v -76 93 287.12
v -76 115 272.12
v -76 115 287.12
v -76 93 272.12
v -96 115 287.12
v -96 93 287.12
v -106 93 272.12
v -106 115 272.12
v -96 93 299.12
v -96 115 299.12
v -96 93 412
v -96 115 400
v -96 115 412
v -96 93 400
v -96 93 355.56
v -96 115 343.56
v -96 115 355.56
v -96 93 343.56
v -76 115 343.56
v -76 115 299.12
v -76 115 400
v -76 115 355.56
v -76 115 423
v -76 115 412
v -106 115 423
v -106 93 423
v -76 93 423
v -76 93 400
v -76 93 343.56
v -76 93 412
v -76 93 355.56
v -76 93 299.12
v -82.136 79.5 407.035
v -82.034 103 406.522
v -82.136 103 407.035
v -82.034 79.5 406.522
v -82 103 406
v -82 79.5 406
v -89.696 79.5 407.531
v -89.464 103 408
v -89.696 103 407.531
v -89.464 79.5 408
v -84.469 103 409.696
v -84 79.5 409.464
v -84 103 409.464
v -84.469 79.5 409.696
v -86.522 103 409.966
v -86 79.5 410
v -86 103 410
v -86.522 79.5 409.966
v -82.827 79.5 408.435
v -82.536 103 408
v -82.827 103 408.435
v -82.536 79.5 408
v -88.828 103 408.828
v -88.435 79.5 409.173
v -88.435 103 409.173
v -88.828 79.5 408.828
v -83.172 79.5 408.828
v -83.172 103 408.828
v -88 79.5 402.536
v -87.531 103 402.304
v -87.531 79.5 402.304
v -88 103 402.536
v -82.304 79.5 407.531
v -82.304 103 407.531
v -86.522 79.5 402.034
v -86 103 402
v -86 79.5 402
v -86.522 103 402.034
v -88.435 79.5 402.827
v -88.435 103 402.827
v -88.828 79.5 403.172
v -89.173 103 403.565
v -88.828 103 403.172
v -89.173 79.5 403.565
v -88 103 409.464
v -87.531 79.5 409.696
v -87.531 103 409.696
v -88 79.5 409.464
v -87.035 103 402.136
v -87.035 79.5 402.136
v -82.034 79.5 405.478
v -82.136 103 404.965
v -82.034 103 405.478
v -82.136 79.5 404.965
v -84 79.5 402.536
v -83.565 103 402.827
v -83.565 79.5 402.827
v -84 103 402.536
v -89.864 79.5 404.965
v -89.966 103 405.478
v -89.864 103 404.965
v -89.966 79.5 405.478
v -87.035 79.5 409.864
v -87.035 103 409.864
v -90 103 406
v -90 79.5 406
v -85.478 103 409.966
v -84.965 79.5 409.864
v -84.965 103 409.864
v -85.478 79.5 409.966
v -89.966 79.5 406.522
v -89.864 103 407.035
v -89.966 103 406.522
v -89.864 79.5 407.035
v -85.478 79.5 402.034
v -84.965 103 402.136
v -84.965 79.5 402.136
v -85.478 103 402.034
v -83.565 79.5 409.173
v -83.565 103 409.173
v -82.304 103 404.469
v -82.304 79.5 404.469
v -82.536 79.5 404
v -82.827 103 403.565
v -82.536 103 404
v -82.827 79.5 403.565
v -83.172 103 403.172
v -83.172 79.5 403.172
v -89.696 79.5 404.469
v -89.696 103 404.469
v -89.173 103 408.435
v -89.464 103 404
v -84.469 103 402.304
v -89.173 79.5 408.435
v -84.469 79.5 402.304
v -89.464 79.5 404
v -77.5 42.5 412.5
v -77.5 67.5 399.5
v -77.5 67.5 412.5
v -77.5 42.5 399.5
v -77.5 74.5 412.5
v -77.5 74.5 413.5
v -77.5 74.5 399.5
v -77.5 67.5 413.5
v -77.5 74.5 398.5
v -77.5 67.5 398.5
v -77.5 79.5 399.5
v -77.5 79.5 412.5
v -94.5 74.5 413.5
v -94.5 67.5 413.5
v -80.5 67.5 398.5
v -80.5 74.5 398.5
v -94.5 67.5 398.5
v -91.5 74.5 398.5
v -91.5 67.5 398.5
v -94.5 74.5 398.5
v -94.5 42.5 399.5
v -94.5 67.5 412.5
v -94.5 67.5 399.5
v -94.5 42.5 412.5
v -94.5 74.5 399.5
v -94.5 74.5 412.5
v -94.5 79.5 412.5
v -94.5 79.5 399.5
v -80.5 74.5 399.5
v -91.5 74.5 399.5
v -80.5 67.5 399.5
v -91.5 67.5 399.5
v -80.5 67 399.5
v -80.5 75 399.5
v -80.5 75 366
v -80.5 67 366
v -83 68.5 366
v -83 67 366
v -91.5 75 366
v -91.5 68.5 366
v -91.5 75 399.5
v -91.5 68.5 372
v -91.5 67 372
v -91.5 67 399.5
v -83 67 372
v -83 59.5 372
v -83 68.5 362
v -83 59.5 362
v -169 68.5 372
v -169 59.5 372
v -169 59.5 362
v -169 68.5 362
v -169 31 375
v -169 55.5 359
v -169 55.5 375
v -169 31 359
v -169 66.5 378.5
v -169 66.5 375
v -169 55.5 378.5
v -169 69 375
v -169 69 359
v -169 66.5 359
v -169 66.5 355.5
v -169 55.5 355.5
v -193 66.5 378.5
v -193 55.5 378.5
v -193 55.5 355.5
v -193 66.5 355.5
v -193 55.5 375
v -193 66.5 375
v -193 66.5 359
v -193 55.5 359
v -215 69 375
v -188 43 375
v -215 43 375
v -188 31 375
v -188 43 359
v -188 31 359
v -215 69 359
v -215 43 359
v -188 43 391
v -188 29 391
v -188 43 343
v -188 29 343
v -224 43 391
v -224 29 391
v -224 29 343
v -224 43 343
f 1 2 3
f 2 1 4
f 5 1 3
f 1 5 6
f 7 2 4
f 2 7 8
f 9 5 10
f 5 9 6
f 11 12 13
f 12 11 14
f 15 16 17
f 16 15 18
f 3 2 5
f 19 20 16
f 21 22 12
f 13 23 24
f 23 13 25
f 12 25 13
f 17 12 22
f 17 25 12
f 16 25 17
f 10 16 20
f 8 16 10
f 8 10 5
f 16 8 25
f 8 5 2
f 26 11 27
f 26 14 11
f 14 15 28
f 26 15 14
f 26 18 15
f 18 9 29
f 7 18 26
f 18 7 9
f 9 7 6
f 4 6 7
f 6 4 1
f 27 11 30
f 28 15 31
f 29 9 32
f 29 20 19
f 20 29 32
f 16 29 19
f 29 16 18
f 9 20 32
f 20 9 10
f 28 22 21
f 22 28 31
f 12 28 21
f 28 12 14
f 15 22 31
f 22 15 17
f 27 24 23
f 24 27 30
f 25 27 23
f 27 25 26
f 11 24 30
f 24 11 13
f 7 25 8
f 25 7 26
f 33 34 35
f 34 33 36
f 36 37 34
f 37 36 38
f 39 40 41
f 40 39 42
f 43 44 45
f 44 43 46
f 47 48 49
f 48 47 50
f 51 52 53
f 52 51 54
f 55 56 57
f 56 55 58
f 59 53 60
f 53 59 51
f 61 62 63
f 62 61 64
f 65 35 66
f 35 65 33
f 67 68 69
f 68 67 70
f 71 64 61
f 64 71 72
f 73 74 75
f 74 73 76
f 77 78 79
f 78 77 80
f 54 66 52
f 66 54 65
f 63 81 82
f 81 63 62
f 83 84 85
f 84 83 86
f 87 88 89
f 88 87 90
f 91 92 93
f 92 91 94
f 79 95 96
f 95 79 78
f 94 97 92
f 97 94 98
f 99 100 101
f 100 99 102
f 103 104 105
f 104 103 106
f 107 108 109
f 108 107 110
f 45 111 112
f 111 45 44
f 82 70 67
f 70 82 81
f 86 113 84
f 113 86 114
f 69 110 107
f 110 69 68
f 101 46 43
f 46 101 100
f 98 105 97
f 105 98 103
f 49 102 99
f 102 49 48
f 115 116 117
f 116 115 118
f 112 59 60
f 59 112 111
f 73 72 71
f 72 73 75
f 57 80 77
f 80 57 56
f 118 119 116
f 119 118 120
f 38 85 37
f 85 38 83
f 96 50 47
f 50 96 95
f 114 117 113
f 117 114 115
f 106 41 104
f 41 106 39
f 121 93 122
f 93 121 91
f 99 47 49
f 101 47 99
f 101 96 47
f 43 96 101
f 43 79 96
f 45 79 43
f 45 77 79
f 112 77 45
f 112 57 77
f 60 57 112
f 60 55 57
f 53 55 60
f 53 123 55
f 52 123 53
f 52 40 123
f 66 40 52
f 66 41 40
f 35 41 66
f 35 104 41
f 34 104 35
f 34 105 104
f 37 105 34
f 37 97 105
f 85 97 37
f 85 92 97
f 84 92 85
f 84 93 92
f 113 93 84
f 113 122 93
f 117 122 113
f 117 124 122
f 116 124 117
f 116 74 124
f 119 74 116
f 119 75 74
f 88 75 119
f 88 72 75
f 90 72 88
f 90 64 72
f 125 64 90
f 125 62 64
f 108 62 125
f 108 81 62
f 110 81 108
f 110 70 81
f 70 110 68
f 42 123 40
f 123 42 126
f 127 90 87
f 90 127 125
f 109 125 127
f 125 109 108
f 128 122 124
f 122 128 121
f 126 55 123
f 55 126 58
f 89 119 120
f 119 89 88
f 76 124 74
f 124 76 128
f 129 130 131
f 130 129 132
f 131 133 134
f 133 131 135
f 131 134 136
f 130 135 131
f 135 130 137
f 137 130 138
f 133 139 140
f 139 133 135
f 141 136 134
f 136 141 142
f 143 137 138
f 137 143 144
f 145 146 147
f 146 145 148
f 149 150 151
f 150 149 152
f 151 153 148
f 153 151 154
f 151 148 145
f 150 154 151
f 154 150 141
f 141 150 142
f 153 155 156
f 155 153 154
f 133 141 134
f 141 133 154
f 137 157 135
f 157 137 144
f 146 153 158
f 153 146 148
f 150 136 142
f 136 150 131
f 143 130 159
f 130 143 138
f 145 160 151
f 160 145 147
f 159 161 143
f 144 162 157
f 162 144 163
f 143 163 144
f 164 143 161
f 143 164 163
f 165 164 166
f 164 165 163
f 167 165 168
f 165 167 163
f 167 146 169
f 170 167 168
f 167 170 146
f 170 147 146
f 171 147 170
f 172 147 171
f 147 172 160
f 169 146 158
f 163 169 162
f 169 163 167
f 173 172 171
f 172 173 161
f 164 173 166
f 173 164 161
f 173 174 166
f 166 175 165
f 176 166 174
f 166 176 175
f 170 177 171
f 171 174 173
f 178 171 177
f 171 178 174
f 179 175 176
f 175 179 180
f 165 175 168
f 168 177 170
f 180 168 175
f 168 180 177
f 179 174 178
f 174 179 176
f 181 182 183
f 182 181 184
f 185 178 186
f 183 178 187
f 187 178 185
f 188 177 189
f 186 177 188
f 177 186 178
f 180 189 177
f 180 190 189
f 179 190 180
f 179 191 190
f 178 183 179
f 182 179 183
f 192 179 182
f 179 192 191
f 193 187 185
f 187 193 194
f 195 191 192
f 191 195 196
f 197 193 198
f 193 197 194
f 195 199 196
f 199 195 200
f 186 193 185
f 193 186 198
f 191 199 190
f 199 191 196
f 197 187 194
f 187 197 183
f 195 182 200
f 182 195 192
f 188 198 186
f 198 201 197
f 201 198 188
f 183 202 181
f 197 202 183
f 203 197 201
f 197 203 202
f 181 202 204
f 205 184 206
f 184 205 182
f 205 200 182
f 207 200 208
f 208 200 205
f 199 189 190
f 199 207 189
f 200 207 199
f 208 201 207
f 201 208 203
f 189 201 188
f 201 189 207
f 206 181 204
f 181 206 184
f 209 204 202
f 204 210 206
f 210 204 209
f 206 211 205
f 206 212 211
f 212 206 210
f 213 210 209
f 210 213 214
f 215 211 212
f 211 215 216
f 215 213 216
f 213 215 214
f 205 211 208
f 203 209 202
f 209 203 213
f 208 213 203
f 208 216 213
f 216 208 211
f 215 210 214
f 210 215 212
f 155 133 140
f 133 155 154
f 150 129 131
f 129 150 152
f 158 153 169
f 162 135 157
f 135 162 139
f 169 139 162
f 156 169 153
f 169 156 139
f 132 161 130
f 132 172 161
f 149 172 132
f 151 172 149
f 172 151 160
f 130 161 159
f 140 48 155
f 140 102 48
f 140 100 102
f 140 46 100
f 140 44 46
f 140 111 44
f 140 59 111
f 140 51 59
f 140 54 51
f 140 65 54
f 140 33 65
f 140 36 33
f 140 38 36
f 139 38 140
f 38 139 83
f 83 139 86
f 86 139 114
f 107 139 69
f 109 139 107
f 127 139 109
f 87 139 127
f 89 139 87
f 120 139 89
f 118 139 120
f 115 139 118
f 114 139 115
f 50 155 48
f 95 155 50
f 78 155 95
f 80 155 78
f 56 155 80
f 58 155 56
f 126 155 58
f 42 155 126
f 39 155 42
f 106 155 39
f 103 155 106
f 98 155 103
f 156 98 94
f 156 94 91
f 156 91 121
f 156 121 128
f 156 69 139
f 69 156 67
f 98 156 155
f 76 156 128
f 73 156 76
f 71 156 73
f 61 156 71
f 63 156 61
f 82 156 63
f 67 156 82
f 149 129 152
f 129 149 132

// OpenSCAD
// Three-position monitor height lock, top slot at reset. Units are mm,
// relative to the stand foot. Set part to assembly, rail, or pin.
part = "assembly";
$fn = 48;

module block(centre, size) {
    translate(centre) cube(size, center=true);
}

module rail() {
    block([-101, 104, 347.56], [10, 22, 150.88]);
    for (shelf = [[279.62, 15], [321.34, 44.44], [377.78, 44.44], [417.50, 11]])
        block([-86, 104, shelf[0]], [20, 22, shelf[1]]);
}

module pin() {
    translate([-86, 87, 406]) {
        rotate([90, 0, 0]) cylinder(d=8, h=32, center=true);
        block([0, -16, 0], [17, 7, 15]);
        block([0, -16, -20], [11, 8, 40]);
        block([-47, -23, -39], [100, 9, 10]);
        block([-95, -26, -39], [24, 11, 23]);
        block([-106, -37, -39], [46, 38, 16]);
        color("orange") block([-120, -51, -39], [36, 14, 48]);
    }
}

if (part == "assembly") {
    rail();
    pin();
    // Envelope of the moving pin guide. Drill and bush the through bore
    // on the pin centreline before bolting the block to the carriage.
    color("silver", .45) block([-86, 61, 406], [17, 37, 13]);
} else if (part == "rail") rail();
else if (part == "pin") pin();
